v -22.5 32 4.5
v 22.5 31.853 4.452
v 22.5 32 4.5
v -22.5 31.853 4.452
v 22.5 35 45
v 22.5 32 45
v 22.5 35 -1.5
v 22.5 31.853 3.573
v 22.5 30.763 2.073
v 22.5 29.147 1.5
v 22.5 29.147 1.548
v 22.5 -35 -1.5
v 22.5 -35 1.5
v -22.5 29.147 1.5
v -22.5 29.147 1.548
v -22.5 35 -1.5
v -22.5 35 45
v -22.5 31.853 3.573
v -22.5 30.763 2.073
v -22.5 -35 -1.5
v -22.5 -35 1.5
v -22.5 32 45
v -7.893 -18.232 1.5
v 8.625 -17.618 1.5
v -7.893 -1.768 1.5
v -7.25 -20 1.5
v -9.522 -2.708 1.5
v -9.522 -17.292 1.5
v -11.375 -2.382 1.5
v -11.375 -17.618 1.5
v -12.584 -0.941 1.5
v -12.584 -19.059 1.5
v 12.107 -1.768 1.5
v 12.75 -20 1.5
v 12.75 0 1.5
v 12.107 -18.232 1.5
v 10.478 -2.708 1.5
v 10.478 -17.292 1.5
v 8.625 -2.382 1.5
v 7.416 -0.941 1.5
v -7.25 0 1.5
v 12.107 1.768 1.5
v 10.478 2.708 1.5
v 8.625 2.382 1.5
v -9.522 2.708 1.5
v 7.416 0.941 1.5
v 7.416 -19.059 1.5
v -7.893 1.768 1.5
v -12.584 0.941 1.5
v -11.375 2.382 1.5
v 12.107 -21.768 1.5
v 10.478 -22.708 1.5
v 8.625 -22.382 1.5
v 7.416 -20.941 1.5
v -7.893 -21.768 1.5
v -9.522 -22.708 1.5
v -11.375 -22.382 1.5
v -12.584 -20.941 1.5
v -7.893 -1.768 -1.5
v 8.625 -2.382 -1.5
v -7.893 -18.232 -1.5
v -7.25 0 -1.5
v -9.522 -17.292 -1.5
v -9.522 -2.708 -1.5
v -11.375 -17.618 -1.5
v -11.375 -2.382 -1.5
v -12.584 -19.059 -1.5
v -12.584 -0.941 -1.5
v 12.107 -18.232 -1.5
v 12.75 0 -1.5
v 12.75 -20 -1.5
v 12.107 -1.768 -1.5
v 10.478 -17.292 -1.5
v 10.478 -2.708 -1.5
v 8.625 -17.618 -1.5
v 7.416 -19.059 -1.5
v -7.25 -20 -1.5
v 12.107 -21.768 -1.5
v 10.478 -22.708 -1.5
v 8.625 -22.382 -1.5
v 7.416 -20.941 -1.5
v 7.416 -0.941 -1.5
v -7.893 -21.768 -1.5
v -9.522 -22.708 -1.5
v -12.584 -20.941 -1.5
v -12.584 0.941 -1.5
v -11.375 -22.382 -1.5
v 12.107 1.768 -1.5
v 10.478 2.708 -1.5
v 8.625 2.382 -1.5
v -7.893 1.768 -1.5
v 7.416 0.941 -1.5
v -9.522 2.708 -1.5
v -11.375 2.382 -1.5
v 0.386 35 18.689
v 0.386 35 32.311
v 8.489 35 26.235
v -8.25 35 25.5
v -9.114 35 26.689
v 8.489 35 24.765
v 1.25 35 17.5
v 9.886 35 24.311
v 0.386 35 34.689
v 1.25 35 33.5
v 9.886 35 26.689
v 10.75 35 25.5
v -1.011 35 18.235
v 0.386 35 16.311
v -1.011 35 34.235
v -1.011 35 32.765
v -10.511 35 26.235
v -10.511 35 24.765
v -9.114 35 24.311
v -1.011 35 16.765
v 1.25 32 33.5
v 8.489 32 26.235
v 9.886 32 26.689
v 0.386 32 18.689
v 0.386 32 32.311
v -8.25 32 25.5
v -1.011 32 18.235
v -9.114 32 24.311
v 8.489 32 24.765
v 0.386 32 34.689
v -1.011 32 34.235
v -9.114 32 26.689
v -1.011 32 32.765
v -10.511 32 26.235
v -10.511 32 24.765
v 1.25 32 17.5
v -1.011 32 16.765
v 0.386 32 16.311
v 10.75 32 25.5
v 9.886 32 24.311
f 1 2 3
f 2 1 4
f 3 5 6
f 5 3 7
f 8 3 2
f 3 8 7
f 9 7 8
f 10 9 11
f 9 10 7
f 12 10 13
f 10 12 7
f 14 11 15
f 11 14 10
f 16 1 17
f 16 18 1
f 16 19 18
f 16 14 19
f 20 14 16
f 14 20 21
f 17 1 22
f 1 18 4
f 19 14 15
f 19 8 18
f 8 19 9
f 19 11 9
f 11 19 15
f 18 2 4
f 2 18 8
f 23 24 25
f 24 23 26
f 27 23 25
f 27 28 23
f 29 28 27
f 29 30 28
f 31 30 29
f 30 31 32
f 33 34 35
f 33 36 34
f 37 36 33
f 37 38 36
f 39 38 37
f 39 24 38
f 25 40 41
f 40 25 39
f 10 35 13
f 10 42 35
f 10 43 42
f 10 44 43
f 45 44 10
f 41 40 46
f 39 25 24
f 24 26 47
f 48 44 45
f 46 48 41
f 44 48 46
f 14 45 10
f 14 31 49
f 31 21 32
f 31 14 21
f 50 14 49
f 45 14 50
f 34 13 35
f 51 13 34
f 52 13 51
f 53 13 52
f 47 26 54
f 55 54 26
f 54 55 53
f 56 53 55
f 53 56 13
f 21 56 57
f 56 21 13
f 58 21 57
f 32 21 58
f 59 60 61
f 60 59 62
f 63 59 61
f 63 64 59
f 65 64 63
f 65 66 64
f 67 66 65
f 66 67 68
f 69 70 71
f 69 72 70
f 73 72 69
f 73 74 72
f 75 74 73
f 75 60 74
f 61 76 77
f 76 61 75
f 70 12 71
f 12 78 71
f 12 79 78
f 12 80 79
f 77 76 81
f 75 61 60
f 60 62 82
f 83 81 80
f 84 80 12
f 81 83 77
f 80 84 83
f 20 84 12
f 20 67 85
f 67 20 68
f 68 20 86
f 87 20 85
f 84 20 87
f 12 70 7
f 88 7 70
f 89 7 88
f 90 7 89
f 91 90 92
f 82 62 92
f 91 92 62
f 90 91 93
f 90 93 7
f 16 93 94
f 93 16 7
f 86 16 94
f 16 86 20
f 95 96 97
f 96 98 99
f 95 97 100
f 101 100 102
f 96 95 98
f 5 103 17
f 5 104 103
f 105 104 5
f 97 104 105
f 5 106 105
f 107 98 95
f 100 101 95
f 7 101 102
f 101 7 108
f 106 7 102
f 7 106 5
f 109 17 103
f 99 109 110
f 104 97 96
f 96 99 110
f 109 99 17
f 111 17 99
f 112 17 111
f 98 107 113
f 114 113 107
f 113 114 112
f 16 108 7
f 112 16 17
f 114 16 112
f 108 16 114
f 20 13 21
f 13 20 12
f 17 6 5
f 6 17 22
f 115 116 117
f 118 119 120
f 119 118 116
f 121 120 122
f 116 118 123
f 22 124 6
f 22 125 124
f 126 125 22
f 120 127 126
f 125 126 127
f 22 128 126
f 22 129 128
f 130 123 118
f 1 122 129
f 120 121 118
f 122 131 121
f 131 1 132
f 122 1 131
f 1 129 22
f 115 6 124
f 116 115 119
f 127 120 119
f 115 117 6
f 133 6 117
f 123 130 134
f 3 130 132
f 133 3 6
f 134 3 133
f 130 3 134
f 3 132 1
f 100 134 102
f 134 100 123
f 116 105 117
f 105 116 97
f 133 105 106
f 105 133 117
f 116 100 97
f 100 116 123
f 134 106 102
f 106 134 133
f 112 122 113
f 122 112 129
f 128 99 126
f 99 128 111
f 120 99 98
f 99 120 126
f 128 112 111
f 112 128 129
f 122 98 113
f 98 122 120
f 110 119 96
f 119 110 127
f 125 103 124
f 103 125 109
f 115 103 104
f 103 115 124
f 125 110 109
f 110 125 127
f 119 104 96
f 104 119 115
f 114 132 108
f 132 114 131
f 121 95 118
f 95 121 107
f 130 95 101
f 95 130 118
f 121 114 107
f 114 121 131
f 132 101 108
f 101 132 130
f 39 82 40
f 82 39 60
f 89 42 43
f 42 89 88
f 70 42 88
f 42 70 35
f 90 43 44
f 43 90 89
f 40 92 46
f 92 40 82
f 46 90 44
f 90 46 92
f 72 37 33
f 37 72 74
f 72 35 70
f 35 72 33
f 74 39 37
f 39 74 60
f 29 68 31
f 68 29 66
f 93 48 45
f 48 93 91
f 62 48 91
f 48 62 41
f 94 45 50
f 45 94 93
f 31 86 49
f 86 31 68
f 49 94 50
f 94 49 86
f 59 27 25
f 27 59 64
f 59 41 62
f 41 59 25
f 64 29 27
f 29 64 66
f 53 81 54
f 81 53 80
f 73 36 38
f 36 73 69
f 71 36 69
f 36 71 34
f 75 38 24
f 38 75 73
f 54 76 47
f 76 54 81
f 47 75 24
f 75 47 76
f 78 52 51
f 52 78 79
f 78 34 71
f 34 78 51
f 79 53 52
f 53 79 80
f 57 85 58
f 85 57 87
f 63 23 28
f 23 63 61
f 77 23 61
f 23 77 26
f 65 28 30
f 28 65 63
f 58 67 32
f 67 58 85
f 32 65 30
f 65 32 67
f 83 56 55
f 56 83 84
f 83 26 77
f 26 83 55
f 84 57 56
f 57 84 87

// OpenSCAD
module MotorMountHoles(depth) {
  mount_width = 19.0;
  mount_height = 16.0;
  screw_type = 2.5;

  translate([mount_width / 2.0, 0.0]) {
    cylinder(r=screw_type / 2.0, h=depth, center=true);
  }
  translate([-mount_width / 2.0, 0.0]) {
    cylinder(r=screw_type / 2.0, h=depth, center=true);
  }

  translate([0.0, mount_height / 2.0]) {
    cylinder(r=screw_type / 2.0, h=depth, center=true);
  }
  translate([0.0, -mount_height / 2.0]) {
    cylinder(r=screw_type / 2.0, h=depth, center=true);
  }
}

module GimbalBracket(width, length, depth) {
  bracket_width = 45;
  bracket_length = 70;

  // bracket
  cube([width, length, depth], center=true);
  translate([0.0, (bracket_length / 2.0) - depth / 2.0, bracket_width / 2.0]) {
    cube([bracket_width, depth, bracket_width], center=true);
  }

  // fillet
  translate([0, (length / 2.0) - depth, depth / 2.0]) {
      rotate([0, 90]) {
        difference() {
            cylinder(r=3, h=bracket_width, center=true);
            translate([-3.0, -3.0, 0.0]) {
              cylinder(r=3, h=bracket_width, center=true);
            }
        }
      }
  }
}

difference() {
  bracket_width = 35;
  bracket_length = 70;
  bracket_depth = 3;

  // gimbal bracket
  GimbalBracket(45, bracket_length, bracket_depth);

  // misumi mount holes
  translate([10.0, 0.0]) cylinder(r=5.5 / 2.0, h=bracket_depth, center=true);
  translate([-10.0, 0.0]) cylinder(r=5.5 / 2.0, h=bracket_depth, center=true);
  translate([10.0, -20.0]) cylinder(r=5.5 / 2.0, h=bracket_depth, center=true);
  translate([-10.0, -20.0]) cylinder(r=5.5 / 2.0, h=bracket_depth, center=true);

  // motor mount holes
  translate([0.0, (bracket_length / 2.0) - (bracket_depth / 2.0), (bracket_width / 2.0) + 8]) {
    rotate([90.0, 0.0, 0.0]) {
      MotorMountHoles(bracket_depth + 0.01);
    }
  }
}
